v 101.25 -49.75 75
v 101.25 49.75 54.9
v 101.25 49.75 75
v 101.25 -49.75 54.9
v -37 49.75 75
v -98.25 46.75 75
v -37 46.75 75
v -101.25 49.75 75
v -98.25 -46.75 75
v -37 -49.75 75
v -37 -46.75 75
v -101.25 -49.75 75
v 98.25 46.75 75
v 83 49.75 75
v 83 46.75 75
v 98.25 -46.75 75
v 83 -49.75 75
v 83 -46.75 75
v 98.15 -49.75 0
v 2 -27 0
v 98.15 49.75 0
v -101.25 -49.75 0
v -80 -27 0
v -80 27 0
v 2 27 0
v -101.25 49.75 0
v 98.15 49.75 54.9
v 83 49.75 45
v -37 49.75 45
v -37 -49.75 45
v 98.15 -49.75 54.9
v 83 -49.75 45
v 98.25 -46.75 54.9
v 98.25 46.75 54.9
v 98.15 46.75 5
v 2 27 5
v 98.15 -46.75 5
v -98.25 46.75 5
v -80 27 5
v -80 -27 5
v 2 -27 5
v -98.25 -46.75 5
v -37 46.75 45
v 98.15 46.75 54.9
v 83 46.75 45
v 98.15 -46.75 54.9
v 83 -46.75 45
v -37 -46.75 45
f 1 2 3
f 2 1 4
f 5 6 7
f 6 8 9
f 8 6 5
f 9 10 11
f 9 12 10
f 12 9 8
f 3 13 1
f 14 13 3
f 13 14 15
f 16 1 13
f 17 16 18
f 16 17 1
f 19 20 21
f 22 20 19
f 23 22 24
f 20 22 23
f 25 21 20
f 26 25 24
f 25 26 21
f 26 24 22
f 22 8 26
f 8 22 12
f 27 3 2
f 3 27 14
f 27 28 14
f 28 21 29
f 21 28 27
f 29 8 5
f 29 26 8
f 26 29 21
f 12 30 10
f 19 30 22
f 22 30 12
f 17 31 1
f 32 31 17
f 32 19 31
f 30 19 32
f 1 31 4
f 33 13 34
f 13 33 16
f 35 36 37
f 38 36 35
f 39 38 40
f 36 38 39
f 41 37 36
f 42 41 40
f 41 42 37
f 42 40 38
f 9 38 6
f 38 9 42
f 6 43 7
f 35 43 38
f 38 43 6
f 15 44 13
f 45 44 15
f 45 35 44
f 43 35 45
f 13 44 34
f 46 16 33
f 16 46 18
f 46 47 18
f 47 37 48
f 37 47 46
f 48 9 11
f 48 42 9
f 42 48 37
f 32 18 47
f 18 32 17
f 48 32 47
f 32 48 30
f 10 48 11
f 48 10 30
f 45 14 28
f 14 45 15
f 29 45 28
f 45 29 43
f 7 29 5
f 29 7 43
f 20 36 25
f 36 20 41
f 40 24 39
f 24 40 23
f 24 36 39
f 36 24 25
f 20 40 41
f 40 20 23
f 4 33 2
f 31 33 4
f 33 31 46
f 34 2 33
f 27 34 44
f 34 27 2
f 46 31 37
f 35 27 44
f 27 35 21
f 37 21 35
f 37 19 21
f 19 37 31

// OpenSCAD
// =======================================
// Caja externa (ajustada a medidas internas dadas)
// =======================================

// hueco interior deseado (para encajar la caja interna)
largo_interno = 196.5;
ancho_interno = 93.5;
alto_interno  = 70;

pared = 3;
base  = 5;

// dimensiones externas calculadas automáticamente
largo = largo_interno + 2*pared; // 202.2
ancho = ancho_interno + 2*pared; // 99.2
alto  = alto_interno + base;      // 70.5

ranura_largo = 120;
ranura_alto  = 30;

// Nueva ranura en la base
ranura_base_largo = 82;
ranura_base_ancho = 54;
ranura_base_espesor = 5;

altura_pared_derecha = 20;

module caja_sin_tapa_centrada(l, a, h, pared, base) {
  difference() {
    // Caja exterior centrada
    translate([-l/2, -a/2, 0])
    cube([l, a, h]);

    // Hueco interior (ajustado: base de 5 mm, paredes de 3 mm)
    translate([-l/2 + pared, -a/2 + pared, base])
    cube([l - 2*pared, a - 2*pared, h]);

    // Ranura lado delantero
    translate([-37, -a/2 - 0.1, h - ranura_alto])
    cube([ranura_largo, pared + 0.2, ranura_alto]);

    // Ranura lado trasero
    translate([-37, a/2 - pared - 0.1, h - ranura_alto])
    cube([ranura_largo, pared + 0.2, ranura_alto]);

    // Ranura en la base (centrada en X=-32.5)
    translate([-39 - ranura_base_largo/2, -ranura_base_ancho/2, -0.1])
    cube([ranura_base_largo, ranura_base_ancho, ranura_base_espesor + 0.2]);

    // Eliminar pared lateral derecha
    translate([l/2 - pared - 0.1, -a/2 - 0.1, -0.1])
    cube([pared + 0.2, a + 0.2, h-altura_pared_derecha]);
    }
}

// Llamada principal
caja_sin_tapa_centrada(largo, ancho, alto, pared, base);
